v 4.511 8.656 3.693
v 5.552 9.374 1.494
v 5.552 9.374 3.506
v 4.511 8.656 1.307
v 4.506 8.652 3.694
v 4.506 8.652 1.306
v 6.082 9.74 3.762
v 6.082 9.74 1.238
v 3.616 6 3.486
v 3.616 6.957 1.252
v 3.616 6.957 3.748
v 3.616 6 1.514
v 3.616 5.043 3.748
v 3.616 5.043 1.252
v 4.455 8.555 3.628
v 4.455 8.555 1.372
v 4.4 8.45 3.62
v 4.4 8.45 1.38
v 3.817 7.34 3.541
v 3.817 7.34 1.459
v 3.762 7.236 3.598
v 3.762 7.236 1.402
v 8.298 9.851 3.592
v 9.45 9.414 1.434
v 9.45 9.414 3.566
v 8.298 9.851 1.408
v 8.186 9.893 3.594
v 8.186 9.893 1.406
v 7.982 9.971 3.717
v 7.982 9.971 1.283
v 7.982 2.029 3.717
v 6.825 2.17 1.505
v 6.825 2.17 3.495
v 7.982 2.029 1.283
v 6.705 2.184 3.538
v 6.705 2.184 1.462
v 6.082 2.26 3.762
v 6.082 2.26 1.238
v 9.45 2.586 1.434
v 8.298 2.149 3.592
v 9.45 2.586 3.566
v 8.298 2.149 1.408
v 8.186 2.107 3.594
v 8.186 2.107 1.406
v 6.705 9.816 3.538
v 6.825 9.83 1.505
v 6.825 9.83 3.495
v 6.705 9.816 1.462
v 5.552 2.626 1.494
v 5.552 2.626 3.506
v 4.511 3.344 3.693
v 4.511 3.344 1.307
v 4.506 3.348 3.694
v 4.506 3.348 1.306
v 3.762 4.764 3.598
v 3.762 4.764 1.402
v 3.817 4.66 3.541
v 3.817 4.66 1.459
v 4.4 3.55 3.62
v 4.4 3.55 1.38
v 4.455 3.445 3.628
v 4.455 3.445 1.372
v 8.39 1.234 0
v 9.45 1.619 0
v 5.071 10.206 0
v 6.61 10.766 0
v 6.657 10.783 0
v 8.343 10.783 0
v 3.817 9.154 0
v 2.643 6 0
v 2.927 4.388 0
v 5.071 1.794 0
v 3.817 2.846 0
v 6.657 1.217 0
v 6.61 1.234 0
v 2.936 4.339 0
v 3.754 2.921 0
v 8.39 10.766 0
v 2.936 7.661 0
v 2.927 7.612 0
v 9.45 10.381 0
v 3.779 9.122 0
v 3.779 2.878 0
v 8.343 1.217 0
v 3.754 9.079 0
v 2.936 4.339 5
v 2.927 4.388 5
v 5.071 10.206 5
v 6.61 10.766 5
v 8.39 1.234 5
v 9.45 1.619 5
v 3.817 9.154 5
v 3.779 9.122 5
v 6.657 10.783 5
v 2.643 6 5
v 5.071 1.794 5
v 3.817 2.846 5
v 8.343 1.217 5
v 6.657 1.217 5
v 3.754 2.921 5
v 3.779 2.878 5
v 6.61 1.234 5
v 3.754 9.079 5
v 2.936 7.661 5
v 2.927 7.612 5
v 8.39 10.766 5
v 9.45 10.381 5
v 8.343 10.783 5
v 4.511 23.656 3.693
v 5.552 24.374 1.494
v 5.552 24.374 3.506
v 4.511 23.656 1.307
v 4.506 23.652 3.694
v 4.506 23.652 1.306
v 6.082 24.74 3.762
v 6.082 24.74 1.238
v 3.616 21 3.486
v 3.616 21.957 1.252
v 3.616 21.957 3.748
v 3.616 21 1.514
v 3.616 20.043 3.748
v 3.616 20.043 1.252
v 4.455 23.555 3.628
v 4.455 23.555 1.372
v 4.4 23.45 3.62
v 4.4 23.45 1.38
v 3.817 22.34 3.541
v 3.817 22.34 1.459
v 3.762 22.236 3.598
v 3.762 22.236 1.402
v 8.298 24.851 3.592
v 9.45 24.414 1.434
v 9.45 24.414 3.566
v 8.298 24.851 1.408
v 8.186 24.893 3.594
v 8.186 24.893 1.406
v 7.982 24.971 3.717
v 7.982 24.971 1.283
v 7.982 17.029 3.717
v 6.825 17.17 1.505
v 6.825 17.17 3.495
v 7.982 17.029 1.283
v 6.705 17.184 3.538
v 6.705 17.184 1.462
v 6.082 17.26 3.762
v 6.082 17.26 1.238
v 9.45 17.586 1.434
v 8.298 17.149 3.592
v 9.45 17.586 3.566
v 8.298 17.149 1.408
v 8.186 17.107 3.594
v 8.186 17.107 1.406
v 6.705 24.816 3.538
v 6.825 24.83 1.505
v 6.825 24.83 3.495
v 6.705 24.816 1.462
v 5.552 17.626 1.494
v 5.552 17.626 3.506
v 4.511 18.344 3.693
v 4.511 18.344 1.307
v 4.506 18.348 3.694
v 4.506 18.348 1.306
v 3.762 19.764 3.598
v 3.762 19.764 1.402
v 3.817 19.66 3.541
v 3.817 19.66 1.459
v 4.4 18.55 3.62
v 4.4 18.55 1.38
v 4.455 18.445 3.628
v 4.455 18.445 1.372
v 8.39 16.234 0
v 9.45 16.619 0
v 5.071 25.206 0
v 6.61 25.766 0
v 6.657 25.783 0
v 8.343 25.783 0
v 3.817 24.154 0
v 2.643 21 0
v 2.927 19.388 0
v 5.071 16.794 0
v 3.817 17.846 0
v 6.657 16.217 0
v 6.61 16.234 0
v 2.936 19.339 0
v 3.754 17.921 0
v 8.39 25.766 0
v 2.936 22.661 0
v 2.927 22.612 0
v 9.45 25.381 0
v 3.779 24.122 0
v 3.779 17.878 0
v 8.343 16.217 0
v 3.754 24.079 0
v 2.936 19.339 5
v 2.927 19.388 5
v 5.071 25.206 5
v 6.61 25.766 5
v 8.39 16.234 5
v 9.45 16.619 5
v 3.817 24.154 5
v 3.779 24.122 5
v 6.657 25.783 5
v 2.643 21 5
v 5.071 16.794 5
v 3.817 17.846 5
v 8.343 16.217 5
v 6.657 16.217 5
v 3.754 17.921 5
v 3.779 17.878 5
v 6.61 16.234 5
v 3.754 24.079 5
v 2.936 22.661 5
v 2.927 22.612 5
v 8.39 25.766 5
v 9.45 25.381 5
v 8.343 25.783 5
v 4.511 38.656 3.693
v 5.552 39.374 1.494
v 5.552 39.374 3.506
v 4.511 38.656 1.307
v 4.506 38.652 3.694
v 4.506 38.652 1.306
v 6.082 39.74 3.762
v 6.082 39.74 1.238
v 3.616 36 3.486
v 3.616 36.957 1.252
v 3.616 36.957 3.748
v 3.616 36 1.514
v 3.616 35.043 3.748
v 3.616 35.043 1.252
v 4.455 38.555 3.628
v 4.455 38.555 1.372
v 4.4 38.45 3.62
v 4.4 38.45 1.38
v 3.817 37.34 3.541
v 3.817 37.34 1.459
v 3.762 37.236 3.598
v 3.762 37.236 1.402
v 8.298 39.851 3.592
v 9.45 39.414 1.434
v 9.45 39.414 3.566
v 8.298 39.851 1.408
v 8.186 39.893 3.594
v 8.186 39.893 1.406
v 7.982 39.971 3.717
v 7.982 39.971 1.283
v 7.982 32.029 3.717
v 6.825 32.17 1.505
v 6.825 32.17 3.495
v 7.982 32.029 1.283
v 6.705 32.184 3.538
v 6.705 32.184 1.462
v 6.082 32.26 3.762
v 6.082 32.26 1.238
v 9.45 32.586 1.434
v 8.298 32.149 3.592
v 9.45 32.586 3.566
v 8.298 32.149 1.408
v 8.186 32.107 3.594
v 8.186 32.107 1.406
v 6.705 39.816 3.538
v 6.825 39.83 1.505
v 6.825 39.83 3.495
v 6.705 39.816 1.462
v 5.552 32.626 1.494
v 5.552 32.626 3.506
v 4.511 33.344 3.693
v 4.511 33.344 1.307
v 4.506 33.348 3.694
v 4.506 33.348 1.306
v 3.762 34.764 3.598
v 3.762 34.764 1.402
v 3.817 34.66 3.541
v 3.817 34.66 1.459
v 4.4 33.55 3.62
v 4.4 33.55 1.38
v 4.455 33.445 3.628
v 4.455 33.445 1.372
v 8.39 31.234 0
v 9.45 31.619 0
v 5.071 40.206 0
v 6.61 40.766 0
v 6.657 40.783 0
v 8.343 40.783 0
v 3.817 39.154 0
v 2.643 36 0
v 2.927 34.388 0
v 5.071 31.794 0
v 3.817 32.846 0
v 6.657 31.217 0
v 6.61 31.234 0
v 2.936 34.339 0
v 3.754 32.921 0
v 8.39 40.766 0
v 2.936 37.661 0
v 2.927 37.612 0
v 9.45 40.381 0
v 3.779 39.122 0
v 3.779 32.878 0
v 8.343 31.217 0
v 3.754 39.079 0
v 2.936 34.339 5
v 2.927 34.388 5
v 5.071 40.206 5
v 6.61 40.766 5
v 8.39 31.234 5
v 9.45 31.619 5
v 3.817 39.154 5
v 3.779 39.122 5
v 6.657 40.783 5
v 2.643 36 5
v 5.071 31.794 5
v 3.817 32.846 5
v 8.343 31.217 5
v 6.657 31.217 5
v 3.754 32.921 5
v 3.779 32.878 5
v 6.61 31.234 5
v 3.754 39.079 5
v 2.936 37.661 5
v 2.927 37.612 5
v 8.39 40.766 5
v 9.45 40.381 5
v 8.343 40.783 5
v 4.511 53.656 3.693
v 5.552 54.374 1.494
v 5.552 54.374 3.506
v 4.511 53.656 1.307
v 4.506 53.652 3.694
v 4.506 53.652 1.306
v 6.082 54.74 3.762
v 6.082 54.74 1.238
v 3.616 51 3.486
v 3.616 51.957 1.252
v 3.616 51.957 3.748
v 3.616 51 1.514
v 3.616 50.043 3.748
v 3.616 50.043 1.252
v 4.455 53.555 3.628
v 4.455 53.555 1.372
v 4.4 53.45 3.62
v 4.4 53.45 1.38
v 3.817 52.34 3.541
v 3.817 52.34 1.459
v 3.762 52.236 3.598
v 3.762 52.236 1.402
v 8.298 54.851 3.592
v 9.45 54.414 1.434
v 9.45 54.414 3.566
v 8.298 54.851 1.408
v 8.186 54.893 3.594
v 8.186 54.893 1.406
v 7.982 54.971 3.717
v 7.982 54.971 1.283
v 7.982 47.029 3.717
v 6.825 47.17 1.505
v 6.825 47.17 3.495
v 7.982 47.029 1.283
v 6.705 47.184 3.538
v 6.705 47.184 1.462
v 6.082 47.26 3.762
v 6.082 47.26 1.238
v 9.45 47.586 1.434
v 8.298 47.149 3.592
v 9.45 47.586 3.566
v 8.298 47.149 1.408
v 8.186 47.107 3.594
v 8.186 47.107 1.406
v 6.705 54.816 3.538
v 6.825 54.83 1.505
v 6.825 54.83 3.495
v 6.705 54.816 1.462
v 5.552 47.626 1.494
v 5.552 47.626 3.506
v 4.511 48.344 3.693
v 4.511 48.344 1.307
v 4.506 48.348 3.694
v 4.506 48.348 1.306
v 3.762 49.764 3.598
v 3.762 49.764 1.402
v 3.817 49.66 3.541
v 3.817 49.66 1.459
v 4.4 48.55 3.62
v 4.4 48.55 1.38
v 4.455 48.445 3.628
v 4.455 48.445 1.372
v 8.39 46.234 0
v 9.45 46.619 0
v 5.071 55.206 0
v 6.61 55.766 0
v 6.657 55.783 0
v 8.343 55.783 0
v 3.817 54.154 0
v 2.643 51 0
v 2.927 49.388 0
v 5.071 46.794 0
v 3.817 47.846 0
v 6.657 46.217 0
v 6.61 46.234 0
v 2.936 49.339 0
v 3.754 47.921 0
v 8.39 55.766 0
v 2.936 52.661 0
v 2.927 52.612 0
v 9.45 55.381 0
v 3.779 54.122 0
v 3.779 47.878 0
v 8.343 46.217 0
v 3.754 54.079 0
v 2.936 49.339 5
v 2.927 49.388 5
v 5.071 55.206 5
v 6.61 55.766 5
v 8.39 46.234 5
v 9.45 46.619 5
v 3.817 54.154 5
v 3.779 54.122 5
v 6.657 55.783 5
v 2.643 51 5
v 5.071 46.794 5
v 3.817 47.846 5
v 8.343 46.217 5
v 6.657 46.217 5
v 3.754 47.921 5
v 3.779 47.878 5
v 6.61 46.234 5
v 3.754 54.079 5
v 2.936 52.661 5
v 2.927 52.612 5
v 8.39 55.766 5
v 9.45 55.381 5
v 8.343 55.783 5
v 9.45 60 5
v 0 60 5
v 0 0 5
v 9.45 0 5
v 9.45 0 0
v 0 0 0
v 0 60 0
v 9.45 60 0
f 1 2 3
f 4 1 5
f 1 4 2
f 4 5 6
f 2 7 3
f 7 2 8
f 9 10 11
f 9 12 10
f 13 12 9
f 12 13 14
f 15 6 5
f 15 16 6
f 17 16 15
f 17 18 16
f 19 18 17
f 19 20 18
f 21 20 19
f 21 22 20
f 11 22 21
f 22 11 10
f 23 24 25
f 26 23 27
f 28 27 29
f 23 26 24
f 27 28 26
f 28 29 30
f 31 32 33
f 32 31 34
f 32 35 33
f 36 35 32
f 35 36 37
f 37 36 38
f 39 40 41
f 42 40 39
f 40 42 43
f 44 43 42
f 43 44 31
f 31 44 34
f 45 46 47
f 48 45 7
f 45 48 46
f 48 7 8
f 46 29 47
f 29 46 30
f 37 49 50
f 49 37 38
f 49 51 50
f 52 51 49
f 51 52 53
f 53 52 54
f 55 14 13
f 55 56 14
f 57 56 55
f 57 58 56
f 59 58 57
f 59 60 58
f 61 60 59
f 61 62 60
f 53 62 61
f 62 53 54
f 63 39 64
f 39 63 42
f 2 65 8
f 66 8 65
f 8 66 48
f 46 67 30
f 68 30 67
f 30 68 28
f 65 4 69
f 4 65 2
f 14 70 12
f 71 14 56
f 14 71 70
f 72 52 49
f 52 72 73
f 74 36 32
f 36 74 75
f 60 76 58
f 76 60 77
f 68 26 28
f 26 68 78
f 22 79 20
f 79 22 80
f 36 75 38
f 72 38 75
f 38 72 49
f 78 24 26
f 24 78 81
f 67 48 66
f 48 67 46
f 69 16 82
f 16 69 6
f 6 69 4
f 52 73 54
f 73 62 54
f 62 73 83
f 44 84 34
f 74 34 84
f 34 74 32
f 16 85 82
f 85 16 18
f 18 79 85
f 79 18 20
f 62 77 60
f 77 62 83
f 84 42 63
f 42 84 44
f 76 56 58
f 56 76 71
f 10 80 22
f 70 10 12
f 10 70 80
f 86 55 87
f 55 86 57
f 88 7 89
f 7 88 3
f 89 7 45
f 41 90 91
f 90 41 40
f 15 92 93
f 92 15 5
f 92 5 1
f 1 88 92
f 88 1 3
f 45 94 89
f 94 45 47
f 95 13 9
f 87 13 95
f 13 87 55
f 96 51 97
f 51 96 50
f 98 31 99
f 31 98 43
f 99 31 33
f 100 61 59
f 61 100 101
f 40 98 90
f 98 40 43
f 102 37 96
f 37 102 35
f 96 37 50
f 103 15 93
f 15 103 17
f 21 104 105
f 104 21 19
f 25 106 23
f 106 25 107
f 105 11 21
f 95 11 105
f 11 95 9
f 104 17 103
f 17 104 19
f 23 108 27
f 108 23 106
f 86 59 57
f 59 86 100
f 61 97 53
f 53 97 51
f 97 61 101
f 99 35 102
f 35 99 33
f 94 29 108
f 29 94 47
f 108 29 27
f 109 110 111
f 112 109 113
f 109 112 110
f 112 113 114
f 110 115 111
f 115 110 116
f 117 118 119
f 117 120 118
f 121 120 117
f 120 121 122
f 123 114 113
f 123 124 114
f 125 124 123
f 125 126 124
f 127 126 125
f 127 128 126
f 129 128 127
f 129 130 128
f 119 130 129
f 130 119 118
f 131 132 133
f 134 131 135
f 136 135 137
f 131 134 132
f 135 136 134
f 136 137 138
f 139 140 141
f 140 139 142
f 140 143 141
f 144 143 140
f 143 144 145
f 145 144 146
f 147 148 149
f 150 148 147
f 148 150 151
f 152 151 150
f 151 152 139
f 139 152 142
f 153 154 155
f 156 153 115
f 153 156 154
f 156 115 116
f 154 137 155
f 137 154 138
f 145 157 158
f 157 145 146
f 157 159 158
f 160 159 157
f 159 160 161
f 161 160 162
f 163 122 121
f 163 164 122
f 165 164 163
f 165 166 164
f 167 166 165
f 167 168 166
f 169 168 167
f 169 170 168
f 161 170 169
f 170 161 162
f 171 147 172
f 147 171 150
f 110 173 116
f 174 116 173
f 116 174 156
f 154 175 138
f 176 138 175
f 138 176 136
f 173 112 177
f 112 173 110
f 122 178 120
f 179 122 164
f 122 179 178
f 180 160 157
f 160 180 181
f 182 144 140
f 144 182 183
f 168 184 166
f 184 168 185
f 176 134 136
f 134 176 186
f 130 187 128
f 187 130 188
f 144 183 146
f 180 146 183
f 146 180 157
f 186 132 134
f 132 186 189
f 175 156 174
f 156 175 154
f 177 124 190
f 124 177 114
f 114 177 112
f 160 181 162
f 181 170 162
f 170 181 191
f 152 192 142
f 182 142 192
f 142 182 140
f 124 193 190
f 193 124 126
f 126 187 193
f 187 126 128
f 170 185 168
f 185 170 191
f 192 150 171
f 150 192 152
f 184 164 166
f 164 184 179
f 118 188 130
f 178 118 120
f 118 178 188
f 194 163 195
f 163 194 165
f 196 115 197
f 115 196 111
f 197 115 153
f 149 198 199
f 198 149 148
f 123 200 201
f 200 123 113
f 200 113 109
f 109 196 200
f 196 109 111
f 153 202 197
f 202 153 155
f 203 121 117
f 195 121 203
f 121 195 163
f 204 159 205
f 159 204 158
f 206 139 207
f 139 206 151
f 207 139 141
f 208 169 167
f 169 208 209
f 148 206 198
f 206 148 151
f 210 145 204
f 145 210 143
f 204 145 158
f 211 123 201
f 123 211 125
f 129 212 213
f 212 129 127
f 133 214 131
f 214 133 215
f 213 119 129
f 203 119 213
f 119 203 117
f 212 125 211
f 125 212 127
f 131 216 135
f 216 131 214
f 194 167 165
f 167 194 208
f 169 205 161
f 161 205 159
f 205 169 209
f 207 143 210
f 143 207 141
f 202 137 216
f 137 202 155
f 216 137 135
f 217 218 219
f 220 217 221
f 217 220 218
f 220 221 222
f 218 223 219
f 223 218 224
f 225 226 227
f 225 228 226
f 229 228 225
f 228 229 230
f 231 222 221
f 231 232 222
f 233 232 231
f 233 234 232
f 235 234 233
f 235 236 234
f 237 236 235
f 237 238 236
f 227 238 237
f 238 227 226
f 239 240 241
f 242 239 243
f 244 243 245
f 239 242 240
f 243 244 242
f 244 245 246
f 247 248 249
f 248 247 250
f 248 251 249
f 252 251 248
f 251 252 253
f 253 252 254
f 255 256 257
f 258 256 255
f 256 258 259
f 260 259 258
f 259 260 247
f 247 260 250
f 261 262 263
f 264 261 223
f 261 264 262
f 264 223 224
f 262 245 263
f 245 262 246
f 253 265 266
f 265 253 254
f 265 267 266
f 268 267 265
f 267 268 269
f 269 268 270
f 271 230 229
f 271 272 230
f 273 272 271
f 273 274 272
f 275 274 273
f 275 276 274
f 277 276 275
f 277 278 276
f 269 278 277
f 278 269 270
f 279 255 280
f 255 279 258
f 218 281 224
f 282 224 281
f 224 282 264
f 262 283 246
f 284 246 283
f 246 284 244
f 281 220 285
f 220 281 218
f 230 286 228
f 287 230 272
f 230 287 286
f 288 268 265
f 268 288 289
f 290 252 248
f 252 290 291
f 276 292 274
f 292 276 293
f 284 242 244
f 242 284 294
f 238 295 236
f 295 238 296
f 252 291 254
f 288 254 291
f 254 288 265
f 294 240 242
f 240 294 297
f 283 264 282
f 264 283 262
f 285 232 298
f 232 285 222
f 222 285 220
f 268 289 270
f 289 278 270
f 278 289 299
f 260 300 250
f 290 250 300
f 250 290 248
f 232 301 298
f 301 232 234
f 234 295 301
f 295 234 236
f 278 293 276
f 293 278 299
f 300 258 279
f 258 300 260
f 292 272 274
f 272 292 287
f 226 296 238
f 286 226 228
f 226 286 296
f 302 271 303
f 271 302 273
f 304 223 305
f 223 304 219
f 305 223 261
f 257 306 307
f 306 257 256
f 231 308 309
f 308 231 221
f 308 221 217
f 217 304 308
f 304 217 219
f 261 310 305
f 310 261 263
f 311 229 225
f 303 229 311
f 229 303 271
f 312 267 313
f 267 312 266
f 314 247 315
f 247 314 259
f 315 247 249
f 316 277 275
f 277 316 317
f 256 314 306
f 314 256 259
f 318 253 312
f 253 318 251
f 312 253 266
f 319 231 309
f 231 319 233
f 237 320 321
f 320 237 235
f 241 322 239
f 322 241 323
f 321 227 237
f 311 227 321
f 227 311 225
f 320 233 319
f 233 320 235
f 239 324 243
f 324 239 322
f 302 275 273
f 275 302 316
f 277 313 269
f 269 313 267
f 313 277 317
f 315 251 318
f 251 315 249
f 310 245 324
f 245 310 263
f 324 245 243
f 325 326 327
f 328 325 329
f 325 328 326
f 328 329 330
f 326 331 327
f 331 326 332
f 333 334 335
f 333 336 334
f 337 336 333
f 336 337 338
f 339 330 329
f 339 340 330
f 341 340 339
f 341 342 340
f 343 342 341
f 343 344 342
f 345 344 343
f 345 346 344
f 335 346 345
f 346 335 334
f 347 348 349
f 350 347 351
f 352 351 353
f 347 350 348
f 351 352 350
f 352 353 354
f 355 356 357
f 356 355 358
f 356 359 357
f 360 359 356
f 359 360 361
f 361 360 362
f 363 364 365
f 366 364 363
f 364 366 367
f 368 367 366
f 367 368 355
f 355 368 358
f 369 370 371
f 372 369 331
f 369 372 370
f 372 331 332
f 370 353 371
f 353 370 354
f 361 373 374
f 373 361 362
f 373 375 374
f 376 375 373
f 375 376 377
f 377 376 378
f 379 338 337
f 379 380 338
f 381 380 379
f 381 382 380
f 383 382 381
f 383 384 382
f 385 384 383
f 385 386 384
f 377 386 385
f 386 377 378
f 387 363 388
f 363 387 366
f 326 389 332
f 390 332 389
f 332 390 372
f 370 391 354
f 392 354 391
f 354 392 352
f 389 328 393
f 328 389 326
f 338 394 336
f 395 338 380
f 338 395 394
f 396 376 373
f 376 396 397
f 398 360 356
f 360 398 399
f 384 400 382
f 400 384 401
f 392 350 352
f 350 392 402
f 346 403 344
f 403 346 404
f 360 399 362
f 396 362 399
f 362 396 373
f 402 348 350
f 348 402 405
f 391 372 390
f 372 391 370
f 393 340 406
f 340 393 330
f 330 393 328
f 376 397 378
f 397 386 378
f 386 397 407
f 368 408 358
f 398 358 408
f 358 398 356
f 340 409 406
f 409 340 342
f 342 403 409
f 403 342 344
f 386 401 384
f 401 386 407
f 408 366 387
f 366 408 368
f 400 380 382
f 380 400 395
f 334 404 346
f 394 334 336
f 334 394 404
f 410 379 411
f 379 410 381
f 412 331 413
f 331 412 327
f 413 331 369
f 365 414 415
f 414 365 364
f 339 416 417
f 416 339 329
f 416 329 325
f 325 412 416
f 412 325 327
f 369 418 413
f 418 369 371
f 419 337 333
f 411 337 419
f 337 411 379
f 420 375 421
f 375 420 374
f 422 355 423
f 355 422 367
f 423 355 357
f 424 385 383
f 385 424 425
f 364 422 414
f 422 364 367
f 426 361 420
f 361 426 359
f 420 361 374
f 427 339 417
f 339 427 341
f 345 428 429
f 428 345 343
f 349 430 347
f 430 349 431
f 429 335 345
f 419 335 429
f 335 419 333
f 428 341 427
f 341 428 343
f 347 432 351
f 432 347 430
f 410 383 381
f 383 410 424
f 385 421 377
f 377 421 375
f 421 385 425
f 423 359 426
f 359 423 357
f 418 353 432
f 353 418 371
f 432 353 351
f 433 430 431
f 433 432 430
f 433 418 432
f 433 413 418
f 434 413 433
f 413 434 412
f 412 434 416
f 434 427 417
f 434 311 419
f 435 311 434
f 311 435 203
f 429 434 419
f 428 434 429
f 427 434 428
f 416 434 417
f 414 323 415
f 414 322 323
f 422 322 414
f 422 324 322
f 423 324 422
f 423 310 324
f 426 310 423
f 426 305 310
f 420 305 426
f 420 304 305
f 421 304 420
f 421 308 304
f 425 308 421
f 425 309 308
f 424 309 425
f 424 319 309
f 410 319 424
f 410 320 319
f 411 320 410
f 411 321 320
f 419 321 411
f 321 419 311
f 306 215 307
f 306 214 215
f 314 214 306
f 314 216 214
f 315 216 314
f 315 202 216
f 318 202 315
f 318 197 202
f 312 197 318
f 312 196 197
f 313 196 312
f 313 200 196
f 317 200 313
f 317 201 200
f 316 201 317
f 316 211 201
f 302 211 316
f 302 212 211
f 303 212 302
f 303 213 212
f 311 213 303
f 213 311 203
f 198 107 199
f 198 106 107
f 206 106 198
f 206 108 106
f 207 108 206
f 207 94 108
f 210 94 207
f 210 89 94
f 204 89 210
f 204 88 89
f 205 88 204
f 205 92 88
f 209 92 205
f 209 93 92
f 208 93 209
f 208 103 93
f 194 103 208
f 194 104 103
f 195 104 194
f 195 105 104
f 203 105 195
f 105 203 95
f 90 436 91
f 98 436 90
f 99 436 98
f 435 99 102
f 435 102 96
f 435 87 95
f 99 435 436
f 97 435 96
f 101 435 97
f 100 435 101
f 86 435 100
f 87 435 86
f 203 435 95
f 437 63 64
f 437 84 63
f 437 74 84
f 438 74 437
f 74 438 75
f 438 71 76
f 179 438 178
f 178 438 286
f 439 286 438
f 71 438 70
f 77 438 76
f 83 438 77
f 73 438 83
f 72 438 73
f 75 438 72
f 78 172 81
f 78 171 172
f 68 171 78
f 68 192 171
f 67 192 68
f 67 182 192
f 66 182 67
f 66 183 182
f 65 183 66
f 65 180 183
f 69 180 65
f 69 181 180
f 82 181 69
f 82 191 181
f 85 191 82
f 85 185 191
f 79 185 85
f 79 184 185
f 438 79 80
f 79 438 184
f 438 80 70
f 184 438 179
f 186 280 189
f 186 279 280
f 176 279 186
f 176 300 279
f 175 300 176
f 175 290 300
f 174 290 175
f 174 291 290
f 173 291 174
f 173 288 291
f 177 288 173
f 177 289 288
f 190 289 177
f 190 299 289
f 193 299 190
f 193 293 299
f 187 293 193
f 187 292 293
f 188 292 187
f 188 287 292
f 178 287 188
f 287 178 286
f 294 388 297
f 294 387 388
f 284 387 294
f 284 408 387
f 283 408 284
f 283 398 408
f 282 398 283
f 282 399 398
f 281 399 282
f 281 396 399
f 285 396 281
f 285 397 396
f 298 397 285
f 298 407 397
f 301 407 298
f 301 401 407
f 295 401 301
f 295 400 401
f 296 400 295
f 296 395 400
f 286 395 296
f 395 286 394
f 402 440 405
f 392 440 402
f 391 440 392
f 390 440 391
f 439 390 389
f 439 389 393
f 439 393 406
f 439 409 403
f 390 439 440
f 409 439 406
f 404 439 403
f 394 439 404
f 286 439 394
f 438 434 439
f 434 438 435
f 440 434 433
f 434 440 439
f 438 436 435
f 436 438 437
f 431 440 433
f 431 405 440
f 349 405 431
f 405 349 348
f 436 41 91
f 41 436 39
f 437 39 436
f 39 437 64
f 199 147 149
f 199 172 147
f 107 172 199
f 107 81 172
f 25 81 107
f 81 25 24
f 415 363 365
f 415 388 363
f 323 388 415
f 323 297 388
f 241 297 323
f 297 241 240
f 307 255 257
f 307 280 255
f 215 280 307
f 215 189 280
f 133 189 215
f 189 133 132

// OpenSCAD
// Spark Plug wire loom clip

//basic size

w=15;
l=60;
t=5;

// add connector clip to valve cover

//main body
difference(){
color("cornflowerblue")cube([w,l,t]);

// cut out holes
wireRadius = 4;

for (i = [6 : l/4 : 54]) {
    translate([.5*w,i,-1]){
        cylinder(h=t+2,r=wireRadius);
        cylinder(h=t+2,r1=wireRadius+1.5,r2=1);
        cylinder(h=t+2,r2=wireRadius+1.5,r1=1);
            }
                }
// remove one third of the side
    translate([.63*w,-1,-1]){
        color("purple")
        cube([w,l+2,t+2]);
        }
    }
    

    
